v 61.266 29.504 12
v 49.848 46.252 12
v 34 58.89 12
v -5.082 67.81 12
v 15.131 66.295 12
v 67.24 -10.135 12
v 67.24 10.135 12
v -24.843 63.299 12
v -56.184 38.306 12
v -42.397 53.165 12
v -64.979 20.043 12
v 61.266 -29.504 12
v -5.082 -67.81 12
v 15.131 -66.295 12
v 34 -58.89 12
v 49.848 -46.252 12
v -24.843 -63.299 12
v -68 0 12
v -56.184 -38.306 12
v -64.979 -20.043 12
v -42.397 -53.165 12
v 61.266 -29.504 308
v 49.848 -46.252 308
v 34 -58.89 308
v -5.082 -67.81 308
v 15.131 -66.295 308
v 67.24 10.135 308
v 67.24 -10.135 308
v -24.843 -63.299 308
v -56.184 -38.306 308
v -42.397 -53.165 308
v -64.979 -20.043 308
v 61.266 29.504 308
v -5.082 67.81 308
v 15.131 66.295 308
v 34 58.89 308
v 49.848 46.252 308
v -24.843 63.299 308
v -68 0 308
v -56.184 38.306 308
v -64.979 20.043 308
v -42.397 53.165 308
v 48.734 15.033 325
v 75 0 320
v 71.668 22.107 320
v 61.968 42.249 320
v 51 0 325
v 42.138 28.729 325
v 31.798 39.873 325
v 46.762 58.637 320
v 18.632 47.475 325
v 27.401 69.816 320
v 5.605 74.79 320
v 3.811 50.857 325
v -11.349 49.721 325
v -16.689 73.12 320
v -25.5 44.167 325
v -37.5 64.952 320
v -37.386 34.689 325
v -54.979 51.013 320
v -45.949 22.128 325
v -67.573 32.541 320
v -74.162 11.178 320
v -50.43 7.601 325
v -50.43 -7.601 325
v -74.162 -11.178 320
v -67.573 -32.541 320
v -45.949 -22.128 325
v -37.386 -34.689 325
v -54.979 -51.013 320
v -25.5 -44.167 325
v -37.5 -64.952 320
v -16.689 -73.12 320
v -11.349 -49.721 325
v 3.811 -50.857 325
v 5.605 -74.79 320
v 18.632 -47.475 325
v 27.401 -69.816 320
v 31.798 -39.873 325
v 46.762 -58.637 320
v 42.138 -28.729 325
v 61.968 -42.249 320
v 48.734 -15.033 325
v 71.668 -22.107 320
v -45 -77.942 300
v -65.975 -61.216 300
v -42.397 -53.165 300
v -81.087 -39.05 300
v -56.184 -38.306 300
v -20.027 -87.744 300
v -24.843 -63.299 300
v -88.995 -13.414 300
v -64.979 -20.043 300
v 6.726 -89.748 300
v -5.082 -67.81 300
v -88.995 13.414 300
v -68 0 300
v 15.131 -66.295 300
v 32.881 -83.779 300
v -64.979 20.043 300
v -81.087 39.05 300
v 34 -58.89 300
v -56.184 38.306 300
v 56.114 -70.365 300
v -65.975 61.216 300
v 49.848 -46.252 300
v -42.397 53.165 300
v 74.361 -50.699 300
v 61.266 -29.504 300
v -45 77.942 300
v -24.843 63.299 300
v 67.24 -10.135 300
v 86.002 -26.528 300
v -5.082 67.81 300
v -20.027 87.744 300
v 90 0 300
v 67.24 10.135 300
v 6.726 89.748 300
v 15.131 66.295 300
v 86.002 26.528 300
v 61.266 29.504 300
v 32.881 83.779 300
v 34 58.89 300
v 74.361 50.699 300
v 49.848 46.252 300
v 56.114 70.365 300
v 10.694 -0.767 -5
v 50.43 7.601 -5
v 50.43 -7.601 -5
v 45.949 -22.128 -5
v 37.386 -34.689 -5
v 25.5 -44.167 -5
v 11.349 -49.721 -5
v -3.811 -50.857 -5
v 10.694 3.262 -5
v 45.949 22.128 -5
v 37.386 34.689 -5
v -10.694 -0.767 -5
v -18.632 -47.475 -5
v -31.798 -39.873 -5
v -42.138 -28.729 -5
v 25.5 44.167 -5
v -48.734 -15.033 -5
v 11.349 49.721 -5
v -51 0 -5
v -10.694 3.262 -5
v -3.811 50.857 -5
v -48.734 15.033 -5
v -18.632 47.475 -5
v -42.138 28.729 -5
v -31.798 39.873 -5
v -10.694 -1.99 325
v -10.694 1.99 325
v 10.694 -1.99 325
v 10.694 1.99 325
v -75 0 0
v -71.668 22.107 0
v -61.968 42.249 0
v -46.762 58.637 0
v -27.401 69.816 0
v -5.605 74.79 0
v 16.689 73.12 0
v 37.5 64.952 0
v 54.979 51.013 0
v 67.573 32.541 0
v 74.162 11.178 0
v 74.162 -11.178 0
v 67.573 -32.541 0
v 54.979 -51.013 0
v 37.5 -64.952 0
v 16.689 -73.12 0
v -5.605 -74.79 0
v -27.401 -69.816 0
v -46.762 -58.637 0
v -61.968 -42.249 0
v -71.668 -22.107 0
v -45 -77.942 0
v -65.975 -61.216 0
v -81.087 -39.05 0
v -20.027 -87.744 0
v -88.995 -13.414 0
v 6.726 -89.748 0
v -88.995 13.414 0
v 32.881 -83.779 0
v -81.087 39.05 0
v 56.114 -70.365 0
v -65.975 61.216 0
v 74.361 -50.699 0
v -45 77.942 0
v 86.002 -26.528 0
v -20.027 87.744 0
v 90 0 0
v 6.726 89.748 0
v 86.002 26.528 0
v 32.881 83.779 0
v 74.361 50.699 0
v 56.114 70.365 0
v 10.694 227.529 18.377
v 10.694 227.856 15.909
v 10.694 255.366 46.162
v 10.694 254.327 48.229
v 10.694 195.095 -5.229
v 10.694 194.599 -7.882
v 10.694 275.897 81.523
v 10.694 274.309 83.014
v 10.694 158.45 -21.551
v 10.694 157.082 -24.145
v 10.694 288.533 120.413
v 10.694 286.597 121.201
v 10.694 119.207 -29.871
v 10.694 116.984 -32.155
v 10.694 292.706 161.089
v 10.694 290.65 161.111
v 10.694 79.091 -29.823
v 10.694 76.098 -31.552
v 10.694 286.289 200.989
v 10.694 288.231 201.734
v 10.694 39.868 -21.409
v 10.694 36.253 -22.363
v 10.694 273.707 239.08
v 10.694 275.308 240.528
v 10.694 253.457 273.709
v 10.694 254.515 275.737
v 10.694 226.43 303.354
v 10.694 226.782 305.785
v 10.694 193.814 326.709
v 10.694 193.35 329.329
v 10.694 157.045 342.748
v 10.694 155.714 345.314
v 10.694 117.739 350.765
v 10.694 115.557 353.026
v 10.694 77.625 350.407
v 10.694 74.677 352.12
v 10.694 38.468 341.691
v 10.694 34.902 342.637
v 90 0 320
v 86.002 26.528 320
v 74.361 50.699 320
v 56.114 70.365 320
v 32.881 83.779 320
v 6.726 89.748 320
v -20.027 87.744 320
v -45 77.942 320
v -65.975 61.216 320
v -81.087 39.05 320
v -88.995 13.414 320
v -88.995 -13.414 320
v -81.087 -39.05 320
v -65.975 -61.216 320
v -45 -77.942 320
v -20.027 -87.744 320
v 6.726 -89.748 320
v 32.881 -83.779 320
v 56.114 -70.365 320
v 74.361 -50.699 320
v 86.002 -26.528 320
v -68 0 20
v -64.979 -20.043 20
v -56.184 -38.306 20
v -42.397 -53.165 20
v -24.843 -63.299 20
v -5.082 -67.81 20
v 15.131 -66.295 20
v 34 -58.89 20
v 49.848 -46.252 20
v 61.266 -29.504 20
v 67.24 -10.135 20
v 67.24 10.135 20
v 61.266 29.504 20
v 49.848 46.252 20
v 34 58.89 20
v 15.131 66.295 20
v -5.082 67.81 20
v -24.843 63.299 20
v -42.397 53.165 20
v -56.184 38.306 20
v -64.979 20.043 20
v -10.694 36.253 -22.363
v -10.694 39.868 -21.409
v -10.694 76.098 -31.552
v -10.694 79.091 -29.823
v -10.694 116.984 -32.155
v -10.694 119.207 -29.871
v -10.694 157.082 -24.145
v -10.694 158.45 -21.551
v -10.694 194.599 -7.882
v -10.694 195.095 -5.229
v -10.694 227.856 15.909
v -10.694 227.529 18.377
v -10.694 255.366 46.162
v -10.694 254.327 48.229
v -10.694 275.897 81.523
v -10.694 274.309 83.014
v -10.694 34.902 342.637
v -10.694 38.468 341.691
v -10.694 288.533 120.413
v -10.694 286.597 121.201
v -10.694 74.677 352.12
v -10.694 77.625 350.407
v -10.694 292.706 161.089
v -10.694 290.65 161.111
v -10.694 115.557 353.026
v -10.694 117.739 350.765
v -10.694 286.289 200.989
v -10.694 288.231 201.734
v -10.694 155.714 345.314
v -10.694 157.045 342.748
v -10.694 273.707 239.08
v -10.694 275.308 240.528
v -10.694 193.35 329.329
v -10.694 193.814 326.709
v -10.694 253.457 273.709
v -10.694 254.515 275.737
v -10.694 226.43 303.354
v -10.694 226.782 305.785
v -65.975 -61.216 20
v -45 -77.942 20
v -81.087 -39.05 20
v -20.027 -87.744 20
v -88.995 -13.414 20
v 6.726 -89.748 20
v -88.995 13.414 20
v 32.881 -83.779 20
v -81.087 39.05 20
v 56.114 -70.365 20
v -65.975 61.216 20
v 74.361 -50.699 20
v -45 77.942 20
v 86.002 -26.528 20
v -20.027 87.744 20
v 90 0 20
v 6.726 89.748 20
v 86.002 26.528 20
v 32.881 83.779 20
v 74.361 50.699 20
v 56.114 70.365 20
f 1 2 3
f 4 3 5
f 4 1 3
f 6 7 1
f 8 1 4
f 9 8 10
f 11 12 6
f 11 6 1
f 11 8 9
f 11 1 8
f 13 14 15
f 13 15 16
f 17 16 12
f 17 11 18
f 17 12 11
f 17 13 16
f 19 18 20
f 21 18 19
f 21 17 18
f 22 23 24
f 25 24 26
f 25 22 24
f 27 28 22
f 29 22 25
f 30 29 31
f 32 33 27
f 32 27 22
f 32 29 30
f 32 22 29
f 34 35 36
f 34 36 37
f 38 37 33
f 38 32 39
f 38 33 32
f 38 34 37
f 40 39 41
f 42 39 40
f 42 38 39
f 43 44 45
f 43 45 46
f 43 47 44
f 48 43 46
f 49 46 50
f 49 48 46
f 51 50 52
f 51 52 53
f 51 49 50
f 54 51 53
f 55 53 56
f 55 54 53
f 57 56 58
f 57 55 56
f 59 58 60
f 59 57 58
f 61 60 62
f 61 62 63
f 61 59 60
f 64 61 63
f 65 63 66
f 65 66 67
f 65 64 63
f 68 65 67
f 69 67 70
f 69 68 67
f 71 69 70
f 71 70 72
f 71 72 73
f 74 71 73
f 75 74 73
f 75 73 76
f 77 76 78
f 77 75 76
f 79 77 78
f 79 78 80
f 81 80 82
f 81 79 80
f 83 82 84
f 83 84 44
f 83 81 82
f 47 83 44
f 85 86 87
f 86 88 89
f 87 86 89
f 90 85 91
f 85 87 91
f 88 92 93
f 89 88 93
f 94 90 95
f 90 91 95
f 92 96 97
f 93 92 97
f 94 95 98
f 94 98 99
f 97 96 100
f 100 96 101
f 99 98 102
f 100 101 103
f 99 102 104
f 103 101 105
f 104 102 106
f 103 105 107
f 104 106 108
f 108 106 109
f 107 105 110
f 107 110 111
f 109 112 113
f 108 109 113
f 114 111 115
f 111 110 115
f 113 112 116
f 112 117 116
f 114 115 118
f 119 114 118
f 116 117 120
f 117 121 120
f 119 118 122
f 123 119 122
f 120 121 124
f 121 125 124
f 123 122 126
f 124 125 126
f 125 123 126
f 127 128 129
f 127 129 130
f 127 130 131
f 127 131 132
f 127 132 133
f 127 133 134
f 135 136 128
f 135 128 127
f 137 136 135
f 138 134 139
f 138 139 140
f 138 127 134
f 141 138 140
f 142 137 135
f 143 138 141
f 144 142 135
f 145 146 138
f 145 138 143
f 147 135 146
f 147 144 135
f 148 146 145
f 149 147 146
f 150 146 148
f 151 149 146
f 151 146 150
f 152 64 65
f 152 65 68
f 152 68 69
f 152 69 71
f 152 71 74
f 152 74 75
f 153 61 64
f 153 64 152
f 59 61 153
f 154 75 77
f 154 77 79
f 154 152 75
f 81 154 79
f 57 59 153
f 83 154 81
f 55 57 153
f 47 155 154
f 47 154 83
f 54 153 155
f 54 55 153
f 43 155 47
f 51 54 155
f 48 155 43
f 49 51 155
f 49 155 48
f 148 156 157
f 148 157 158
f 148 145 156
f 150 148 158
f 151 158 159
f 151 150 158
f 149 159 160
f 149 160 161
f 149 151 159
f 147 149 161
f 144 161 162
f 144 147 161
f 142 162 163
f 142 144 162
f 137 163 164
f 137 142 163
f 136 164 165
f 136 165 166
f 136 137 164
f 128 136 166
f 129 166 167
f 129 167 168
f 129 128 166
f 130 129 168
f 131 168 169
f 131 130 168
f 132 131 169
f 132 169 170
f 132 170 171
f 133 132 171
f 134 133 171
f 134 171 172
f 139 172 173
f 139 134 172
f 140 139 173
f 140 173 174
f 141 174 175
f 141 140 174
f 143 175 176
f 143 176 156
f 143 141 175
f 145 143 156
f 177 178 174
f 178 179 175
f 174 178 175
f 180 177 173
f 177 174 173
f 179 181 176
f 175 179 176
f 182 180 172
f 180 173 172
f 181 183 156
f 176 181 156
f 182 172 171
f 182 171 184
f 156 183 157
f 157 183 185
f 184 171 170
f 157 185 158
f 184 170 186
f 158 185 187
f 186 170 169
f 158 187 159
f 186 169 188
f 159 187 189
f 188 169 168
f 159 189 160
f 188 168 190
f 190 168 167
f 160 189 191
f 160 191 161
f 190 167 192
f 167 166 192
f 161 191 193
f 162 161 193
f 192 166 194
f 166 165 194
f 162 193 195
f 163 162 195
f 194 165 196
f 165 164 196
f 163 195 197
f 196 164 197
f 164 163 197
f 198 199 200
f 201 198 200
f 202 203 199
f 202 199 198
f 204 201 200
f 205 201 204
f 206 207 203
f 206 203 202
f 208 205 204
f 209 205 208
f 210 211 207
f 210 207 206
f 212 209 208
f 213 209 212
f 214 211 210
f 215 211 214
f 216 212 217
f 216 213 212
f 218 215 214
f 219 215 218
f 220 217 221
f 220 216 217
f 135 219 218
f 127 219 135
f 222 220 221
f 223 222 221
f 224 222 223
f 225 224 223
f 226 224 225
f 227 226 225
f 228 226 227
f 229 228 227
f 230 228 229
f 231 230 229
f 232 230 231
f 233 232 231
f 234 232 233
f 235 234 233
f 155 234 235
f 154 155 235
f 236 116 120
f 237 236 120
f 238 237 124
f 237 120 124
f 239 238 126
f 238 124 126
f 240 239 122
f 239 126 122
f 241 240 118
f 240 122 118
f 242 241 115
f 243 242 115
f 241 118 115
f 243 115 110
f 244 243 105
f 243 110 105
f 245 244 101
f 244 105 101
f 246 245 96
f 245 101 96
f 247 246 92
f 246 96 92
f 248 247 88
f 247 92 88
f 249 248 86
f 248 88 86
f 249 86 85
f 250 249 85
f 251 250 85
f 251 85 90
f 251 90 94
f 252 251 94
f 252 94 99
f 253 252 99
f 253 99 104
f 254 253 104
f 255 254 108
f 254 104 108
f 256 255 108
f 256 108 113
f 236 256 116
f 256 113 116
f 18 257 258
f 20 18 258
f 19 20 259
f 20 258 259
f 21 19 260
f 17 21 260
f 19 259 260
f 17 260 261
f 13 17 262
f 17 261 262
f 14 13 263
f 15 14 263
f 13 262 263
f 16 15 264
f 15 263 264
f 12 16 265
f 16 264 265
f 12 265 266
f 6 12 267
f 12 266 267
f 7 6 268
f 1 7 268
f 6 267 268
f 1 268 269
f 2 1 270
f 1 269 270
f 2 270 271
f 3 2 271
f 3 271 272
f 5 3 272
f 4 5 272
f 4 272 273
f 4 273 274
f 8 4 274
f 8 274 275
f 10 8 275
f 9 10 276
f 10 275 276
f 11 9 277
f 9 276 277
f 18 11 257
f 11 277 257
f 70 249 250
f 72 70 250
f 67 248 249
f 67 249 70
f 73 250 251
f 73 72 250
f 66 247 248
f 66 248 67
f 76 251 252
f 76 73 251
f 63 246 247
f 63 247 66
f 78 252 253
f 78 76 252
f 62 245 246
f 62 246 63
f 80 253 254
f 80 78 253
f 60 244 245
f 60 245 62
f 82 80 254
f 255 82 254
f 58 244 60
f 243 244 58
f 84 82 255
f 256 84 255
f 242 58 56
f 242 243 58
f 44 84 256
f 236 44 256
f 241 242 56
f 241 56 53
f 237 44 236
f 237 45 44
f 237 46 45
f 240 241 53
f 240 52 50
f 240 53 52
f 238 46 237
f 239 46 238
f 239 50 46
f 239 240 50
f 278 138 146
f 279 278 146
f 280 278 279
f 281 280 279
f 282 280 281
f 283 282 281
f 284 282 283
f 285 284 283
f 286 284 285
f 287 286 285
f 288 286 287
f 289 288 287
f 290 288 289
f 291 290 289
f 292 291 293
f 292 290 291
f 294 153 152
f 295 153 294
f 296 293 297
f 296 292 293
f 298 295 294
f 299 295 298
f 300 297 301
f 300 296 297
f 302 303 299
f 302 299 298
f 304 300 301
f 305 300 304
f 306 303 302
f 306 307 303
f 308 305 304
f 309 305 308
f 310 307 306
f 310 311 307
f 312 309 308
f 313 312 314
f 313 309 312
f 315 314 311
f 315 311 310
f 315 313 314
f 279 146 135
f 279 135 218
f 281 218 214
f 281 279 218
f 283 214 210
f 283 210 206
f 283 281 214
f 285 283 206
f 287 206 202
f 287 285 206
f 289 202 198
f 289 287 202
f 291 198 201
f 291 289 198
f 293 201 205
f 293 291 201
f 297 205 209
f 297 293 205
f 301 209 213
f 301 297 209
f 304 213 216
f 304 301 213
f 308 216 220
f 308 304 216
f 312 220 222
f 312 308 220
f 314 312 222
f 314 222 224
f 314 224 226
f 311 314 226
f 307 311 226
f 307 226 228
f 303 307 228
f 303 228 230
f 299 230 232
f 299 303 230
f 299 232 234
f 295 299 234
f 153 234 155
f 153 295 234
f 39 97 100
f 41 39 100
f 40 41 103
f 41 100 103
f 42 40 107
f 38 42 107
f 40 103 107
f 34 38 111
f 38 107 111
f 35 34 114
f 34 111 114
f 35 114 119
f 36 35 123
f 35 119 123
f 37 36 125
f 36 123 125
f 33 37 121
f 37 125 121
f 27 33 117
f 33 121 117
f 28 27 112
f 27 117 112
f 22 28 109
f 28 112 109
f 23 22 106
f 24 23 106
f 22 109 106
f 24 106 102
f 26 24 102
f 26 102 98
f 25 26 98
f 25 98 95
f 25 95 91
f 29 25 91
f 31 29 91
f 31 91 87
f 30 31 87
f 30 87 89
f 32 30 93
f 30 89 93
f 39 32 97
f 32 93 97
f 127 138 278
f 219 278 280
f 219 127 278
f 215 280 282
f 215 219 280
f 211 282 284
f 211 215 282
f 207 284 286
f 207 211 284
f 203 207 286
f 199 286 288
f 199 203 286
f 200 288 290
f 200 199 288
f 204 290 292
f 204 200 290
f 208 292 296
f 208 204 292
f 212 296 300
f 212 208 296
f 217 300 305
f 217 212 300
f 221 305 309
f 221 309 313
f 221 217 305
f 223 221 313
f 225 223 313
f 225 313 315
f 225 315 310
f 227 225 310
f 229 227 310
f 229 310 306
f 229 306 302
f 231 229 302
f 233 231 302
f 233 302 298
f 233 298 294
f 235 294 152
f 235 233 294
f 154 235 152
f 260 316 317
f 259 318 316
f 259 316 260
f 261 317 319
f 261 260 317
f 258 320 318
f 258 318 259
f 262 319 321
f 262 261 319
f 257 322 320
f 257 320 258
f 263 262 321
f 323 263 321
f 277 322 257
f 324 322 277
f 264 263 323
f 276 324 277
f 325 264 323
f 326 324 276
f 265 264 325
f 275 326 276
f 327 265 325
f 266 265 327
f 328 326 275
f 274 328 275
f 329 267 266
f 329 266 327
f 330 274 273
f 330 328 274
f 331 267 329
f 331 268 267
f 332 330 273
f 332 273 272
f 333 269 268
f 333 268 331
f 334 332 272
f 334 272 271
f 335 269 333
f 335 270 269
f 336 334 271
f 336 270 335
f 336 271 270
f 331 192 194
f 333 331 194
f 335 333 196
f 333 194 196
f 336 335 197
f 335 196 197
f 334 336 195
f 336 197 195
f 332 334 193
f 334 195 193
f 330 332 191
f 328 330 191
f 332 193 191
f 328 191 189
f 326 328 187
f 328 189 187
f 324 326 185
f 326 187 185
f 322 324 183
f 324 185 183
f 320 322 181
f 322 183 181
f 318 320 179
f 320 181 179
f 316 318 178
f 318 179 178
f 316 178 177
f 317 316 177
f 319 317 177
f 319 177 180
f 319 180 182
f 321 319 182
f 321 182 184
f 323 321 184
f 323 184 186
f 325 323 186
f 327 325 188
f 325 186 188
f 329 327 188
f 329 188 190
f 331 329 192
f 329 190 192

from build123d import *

# Parameters (mm, degrees)
SKETCH_1_R          = 90
EXTRUDE_1_DEPTH     = 20
SKETCH_2_R          = 90
EXTRUDE_2_DEPTH     = 20
SKETCH_3_R          = 68
CUT_EXTRUDE_1_DEPTH = 8
SKETCH_4_R          = 68
CUT_EXTRUDE_2_DEPTH = 8
SKETCH_5_R          = 75
SKETCH_7_R          = 51
SKETCH_8_R          = 75
SKETCH_9_R          = 51
SKETCH_11_W         = 21.388157758
SKETCH_11_H         = 3.979192142


with BuildPart() as part:
    # 草图1 → 凸台-拉伸1 (new body)
    with BuildSketch(Plane.XY):
        Circle(SKETCH_1_R)
    extrude(amount=EXTRUDE_1_DEPTH)

    # 草图4 → 切除-拉伸2 (cut)
    with BuildSketch(Plane.XY.offset(20)):
        with Locations(Location((0, 0, 0), (0, 0, 180))):
            Circle(SKETCH_4_R)
    extrude(amount=-CUT_EXTRUDE_2_DEPTH, mode=Mode.SUBTRACT)

    # 草图8 → 放样2 section 0
    with BuildSketch(Plane(origin=(0, 0, 0), x_dir=(-1, 0, 0), z_dir=(0, 0, -1))):
        Circle(SKETCH_8_R)
    # 草图9 → 放样2 section 1
    with BuildSketch(Plane(origin=(0, 0, -5), x_dir=(-1, 0, 0), z_dir=(0, 0, -1))):
        Circle(SKETCH_9_R)
    loft()



with BuildPart() as body_2:
    # 草图2 → 凸台-拉伸2 (new body)
    with BuildSketch(Plane.XY.offset(300)):
        Circle(SKETCH_2_R)
    extrude(amount=EXTRUDE_2_DEPTH)

    # 草图3 → 切除-拉伸1 (cut)
    with BuildSketch(Plane(origin=(0, 0, 300), x_dir=(-1, 0, 0), z_dir=(0, 0, -1))):
        Circle(SKETCH_3_R)
    extrude(amount=-CUT_EXTRUDE_1_DEPTH, mode=Mode.SUBTRACT)

    # 草图5 → 放样1 section 0
    with BuildSketch(Plane.XY.offset(320)):
        Circle(SKETCH_5_R)
    # 草图7 → 放样1 section 1
    with BuildSketch(Plane.XY.offset(325)):
        Circle(SKETCH_7_R)
    loft()


with BuildPart() as part_1:
    add(part.part)

    add(body_2.part)  # 扫描1 merges body 2
    # 扫描1: sweep along a path in 草图14
    with BuildLine(Plane(origin=(0, 0, 0), x_dir=(0, 0, -1), z_dir=(1, 0, 0))) as sweep_1_path:
        ThreePointArc((-5.541455061, -14.409759427), (-160.373186446, 291.522166595), (-315.20491783, -14.409759427))
    # 草图11 → 扫描1 (sweep)
    with BuildSketch(Plane.XY.offset(325)):
        Rectangle(SKETCH_11_W, SKETCH_11_H)
    sweep(path=sweep_1_path.line)


solid = part_1.part
